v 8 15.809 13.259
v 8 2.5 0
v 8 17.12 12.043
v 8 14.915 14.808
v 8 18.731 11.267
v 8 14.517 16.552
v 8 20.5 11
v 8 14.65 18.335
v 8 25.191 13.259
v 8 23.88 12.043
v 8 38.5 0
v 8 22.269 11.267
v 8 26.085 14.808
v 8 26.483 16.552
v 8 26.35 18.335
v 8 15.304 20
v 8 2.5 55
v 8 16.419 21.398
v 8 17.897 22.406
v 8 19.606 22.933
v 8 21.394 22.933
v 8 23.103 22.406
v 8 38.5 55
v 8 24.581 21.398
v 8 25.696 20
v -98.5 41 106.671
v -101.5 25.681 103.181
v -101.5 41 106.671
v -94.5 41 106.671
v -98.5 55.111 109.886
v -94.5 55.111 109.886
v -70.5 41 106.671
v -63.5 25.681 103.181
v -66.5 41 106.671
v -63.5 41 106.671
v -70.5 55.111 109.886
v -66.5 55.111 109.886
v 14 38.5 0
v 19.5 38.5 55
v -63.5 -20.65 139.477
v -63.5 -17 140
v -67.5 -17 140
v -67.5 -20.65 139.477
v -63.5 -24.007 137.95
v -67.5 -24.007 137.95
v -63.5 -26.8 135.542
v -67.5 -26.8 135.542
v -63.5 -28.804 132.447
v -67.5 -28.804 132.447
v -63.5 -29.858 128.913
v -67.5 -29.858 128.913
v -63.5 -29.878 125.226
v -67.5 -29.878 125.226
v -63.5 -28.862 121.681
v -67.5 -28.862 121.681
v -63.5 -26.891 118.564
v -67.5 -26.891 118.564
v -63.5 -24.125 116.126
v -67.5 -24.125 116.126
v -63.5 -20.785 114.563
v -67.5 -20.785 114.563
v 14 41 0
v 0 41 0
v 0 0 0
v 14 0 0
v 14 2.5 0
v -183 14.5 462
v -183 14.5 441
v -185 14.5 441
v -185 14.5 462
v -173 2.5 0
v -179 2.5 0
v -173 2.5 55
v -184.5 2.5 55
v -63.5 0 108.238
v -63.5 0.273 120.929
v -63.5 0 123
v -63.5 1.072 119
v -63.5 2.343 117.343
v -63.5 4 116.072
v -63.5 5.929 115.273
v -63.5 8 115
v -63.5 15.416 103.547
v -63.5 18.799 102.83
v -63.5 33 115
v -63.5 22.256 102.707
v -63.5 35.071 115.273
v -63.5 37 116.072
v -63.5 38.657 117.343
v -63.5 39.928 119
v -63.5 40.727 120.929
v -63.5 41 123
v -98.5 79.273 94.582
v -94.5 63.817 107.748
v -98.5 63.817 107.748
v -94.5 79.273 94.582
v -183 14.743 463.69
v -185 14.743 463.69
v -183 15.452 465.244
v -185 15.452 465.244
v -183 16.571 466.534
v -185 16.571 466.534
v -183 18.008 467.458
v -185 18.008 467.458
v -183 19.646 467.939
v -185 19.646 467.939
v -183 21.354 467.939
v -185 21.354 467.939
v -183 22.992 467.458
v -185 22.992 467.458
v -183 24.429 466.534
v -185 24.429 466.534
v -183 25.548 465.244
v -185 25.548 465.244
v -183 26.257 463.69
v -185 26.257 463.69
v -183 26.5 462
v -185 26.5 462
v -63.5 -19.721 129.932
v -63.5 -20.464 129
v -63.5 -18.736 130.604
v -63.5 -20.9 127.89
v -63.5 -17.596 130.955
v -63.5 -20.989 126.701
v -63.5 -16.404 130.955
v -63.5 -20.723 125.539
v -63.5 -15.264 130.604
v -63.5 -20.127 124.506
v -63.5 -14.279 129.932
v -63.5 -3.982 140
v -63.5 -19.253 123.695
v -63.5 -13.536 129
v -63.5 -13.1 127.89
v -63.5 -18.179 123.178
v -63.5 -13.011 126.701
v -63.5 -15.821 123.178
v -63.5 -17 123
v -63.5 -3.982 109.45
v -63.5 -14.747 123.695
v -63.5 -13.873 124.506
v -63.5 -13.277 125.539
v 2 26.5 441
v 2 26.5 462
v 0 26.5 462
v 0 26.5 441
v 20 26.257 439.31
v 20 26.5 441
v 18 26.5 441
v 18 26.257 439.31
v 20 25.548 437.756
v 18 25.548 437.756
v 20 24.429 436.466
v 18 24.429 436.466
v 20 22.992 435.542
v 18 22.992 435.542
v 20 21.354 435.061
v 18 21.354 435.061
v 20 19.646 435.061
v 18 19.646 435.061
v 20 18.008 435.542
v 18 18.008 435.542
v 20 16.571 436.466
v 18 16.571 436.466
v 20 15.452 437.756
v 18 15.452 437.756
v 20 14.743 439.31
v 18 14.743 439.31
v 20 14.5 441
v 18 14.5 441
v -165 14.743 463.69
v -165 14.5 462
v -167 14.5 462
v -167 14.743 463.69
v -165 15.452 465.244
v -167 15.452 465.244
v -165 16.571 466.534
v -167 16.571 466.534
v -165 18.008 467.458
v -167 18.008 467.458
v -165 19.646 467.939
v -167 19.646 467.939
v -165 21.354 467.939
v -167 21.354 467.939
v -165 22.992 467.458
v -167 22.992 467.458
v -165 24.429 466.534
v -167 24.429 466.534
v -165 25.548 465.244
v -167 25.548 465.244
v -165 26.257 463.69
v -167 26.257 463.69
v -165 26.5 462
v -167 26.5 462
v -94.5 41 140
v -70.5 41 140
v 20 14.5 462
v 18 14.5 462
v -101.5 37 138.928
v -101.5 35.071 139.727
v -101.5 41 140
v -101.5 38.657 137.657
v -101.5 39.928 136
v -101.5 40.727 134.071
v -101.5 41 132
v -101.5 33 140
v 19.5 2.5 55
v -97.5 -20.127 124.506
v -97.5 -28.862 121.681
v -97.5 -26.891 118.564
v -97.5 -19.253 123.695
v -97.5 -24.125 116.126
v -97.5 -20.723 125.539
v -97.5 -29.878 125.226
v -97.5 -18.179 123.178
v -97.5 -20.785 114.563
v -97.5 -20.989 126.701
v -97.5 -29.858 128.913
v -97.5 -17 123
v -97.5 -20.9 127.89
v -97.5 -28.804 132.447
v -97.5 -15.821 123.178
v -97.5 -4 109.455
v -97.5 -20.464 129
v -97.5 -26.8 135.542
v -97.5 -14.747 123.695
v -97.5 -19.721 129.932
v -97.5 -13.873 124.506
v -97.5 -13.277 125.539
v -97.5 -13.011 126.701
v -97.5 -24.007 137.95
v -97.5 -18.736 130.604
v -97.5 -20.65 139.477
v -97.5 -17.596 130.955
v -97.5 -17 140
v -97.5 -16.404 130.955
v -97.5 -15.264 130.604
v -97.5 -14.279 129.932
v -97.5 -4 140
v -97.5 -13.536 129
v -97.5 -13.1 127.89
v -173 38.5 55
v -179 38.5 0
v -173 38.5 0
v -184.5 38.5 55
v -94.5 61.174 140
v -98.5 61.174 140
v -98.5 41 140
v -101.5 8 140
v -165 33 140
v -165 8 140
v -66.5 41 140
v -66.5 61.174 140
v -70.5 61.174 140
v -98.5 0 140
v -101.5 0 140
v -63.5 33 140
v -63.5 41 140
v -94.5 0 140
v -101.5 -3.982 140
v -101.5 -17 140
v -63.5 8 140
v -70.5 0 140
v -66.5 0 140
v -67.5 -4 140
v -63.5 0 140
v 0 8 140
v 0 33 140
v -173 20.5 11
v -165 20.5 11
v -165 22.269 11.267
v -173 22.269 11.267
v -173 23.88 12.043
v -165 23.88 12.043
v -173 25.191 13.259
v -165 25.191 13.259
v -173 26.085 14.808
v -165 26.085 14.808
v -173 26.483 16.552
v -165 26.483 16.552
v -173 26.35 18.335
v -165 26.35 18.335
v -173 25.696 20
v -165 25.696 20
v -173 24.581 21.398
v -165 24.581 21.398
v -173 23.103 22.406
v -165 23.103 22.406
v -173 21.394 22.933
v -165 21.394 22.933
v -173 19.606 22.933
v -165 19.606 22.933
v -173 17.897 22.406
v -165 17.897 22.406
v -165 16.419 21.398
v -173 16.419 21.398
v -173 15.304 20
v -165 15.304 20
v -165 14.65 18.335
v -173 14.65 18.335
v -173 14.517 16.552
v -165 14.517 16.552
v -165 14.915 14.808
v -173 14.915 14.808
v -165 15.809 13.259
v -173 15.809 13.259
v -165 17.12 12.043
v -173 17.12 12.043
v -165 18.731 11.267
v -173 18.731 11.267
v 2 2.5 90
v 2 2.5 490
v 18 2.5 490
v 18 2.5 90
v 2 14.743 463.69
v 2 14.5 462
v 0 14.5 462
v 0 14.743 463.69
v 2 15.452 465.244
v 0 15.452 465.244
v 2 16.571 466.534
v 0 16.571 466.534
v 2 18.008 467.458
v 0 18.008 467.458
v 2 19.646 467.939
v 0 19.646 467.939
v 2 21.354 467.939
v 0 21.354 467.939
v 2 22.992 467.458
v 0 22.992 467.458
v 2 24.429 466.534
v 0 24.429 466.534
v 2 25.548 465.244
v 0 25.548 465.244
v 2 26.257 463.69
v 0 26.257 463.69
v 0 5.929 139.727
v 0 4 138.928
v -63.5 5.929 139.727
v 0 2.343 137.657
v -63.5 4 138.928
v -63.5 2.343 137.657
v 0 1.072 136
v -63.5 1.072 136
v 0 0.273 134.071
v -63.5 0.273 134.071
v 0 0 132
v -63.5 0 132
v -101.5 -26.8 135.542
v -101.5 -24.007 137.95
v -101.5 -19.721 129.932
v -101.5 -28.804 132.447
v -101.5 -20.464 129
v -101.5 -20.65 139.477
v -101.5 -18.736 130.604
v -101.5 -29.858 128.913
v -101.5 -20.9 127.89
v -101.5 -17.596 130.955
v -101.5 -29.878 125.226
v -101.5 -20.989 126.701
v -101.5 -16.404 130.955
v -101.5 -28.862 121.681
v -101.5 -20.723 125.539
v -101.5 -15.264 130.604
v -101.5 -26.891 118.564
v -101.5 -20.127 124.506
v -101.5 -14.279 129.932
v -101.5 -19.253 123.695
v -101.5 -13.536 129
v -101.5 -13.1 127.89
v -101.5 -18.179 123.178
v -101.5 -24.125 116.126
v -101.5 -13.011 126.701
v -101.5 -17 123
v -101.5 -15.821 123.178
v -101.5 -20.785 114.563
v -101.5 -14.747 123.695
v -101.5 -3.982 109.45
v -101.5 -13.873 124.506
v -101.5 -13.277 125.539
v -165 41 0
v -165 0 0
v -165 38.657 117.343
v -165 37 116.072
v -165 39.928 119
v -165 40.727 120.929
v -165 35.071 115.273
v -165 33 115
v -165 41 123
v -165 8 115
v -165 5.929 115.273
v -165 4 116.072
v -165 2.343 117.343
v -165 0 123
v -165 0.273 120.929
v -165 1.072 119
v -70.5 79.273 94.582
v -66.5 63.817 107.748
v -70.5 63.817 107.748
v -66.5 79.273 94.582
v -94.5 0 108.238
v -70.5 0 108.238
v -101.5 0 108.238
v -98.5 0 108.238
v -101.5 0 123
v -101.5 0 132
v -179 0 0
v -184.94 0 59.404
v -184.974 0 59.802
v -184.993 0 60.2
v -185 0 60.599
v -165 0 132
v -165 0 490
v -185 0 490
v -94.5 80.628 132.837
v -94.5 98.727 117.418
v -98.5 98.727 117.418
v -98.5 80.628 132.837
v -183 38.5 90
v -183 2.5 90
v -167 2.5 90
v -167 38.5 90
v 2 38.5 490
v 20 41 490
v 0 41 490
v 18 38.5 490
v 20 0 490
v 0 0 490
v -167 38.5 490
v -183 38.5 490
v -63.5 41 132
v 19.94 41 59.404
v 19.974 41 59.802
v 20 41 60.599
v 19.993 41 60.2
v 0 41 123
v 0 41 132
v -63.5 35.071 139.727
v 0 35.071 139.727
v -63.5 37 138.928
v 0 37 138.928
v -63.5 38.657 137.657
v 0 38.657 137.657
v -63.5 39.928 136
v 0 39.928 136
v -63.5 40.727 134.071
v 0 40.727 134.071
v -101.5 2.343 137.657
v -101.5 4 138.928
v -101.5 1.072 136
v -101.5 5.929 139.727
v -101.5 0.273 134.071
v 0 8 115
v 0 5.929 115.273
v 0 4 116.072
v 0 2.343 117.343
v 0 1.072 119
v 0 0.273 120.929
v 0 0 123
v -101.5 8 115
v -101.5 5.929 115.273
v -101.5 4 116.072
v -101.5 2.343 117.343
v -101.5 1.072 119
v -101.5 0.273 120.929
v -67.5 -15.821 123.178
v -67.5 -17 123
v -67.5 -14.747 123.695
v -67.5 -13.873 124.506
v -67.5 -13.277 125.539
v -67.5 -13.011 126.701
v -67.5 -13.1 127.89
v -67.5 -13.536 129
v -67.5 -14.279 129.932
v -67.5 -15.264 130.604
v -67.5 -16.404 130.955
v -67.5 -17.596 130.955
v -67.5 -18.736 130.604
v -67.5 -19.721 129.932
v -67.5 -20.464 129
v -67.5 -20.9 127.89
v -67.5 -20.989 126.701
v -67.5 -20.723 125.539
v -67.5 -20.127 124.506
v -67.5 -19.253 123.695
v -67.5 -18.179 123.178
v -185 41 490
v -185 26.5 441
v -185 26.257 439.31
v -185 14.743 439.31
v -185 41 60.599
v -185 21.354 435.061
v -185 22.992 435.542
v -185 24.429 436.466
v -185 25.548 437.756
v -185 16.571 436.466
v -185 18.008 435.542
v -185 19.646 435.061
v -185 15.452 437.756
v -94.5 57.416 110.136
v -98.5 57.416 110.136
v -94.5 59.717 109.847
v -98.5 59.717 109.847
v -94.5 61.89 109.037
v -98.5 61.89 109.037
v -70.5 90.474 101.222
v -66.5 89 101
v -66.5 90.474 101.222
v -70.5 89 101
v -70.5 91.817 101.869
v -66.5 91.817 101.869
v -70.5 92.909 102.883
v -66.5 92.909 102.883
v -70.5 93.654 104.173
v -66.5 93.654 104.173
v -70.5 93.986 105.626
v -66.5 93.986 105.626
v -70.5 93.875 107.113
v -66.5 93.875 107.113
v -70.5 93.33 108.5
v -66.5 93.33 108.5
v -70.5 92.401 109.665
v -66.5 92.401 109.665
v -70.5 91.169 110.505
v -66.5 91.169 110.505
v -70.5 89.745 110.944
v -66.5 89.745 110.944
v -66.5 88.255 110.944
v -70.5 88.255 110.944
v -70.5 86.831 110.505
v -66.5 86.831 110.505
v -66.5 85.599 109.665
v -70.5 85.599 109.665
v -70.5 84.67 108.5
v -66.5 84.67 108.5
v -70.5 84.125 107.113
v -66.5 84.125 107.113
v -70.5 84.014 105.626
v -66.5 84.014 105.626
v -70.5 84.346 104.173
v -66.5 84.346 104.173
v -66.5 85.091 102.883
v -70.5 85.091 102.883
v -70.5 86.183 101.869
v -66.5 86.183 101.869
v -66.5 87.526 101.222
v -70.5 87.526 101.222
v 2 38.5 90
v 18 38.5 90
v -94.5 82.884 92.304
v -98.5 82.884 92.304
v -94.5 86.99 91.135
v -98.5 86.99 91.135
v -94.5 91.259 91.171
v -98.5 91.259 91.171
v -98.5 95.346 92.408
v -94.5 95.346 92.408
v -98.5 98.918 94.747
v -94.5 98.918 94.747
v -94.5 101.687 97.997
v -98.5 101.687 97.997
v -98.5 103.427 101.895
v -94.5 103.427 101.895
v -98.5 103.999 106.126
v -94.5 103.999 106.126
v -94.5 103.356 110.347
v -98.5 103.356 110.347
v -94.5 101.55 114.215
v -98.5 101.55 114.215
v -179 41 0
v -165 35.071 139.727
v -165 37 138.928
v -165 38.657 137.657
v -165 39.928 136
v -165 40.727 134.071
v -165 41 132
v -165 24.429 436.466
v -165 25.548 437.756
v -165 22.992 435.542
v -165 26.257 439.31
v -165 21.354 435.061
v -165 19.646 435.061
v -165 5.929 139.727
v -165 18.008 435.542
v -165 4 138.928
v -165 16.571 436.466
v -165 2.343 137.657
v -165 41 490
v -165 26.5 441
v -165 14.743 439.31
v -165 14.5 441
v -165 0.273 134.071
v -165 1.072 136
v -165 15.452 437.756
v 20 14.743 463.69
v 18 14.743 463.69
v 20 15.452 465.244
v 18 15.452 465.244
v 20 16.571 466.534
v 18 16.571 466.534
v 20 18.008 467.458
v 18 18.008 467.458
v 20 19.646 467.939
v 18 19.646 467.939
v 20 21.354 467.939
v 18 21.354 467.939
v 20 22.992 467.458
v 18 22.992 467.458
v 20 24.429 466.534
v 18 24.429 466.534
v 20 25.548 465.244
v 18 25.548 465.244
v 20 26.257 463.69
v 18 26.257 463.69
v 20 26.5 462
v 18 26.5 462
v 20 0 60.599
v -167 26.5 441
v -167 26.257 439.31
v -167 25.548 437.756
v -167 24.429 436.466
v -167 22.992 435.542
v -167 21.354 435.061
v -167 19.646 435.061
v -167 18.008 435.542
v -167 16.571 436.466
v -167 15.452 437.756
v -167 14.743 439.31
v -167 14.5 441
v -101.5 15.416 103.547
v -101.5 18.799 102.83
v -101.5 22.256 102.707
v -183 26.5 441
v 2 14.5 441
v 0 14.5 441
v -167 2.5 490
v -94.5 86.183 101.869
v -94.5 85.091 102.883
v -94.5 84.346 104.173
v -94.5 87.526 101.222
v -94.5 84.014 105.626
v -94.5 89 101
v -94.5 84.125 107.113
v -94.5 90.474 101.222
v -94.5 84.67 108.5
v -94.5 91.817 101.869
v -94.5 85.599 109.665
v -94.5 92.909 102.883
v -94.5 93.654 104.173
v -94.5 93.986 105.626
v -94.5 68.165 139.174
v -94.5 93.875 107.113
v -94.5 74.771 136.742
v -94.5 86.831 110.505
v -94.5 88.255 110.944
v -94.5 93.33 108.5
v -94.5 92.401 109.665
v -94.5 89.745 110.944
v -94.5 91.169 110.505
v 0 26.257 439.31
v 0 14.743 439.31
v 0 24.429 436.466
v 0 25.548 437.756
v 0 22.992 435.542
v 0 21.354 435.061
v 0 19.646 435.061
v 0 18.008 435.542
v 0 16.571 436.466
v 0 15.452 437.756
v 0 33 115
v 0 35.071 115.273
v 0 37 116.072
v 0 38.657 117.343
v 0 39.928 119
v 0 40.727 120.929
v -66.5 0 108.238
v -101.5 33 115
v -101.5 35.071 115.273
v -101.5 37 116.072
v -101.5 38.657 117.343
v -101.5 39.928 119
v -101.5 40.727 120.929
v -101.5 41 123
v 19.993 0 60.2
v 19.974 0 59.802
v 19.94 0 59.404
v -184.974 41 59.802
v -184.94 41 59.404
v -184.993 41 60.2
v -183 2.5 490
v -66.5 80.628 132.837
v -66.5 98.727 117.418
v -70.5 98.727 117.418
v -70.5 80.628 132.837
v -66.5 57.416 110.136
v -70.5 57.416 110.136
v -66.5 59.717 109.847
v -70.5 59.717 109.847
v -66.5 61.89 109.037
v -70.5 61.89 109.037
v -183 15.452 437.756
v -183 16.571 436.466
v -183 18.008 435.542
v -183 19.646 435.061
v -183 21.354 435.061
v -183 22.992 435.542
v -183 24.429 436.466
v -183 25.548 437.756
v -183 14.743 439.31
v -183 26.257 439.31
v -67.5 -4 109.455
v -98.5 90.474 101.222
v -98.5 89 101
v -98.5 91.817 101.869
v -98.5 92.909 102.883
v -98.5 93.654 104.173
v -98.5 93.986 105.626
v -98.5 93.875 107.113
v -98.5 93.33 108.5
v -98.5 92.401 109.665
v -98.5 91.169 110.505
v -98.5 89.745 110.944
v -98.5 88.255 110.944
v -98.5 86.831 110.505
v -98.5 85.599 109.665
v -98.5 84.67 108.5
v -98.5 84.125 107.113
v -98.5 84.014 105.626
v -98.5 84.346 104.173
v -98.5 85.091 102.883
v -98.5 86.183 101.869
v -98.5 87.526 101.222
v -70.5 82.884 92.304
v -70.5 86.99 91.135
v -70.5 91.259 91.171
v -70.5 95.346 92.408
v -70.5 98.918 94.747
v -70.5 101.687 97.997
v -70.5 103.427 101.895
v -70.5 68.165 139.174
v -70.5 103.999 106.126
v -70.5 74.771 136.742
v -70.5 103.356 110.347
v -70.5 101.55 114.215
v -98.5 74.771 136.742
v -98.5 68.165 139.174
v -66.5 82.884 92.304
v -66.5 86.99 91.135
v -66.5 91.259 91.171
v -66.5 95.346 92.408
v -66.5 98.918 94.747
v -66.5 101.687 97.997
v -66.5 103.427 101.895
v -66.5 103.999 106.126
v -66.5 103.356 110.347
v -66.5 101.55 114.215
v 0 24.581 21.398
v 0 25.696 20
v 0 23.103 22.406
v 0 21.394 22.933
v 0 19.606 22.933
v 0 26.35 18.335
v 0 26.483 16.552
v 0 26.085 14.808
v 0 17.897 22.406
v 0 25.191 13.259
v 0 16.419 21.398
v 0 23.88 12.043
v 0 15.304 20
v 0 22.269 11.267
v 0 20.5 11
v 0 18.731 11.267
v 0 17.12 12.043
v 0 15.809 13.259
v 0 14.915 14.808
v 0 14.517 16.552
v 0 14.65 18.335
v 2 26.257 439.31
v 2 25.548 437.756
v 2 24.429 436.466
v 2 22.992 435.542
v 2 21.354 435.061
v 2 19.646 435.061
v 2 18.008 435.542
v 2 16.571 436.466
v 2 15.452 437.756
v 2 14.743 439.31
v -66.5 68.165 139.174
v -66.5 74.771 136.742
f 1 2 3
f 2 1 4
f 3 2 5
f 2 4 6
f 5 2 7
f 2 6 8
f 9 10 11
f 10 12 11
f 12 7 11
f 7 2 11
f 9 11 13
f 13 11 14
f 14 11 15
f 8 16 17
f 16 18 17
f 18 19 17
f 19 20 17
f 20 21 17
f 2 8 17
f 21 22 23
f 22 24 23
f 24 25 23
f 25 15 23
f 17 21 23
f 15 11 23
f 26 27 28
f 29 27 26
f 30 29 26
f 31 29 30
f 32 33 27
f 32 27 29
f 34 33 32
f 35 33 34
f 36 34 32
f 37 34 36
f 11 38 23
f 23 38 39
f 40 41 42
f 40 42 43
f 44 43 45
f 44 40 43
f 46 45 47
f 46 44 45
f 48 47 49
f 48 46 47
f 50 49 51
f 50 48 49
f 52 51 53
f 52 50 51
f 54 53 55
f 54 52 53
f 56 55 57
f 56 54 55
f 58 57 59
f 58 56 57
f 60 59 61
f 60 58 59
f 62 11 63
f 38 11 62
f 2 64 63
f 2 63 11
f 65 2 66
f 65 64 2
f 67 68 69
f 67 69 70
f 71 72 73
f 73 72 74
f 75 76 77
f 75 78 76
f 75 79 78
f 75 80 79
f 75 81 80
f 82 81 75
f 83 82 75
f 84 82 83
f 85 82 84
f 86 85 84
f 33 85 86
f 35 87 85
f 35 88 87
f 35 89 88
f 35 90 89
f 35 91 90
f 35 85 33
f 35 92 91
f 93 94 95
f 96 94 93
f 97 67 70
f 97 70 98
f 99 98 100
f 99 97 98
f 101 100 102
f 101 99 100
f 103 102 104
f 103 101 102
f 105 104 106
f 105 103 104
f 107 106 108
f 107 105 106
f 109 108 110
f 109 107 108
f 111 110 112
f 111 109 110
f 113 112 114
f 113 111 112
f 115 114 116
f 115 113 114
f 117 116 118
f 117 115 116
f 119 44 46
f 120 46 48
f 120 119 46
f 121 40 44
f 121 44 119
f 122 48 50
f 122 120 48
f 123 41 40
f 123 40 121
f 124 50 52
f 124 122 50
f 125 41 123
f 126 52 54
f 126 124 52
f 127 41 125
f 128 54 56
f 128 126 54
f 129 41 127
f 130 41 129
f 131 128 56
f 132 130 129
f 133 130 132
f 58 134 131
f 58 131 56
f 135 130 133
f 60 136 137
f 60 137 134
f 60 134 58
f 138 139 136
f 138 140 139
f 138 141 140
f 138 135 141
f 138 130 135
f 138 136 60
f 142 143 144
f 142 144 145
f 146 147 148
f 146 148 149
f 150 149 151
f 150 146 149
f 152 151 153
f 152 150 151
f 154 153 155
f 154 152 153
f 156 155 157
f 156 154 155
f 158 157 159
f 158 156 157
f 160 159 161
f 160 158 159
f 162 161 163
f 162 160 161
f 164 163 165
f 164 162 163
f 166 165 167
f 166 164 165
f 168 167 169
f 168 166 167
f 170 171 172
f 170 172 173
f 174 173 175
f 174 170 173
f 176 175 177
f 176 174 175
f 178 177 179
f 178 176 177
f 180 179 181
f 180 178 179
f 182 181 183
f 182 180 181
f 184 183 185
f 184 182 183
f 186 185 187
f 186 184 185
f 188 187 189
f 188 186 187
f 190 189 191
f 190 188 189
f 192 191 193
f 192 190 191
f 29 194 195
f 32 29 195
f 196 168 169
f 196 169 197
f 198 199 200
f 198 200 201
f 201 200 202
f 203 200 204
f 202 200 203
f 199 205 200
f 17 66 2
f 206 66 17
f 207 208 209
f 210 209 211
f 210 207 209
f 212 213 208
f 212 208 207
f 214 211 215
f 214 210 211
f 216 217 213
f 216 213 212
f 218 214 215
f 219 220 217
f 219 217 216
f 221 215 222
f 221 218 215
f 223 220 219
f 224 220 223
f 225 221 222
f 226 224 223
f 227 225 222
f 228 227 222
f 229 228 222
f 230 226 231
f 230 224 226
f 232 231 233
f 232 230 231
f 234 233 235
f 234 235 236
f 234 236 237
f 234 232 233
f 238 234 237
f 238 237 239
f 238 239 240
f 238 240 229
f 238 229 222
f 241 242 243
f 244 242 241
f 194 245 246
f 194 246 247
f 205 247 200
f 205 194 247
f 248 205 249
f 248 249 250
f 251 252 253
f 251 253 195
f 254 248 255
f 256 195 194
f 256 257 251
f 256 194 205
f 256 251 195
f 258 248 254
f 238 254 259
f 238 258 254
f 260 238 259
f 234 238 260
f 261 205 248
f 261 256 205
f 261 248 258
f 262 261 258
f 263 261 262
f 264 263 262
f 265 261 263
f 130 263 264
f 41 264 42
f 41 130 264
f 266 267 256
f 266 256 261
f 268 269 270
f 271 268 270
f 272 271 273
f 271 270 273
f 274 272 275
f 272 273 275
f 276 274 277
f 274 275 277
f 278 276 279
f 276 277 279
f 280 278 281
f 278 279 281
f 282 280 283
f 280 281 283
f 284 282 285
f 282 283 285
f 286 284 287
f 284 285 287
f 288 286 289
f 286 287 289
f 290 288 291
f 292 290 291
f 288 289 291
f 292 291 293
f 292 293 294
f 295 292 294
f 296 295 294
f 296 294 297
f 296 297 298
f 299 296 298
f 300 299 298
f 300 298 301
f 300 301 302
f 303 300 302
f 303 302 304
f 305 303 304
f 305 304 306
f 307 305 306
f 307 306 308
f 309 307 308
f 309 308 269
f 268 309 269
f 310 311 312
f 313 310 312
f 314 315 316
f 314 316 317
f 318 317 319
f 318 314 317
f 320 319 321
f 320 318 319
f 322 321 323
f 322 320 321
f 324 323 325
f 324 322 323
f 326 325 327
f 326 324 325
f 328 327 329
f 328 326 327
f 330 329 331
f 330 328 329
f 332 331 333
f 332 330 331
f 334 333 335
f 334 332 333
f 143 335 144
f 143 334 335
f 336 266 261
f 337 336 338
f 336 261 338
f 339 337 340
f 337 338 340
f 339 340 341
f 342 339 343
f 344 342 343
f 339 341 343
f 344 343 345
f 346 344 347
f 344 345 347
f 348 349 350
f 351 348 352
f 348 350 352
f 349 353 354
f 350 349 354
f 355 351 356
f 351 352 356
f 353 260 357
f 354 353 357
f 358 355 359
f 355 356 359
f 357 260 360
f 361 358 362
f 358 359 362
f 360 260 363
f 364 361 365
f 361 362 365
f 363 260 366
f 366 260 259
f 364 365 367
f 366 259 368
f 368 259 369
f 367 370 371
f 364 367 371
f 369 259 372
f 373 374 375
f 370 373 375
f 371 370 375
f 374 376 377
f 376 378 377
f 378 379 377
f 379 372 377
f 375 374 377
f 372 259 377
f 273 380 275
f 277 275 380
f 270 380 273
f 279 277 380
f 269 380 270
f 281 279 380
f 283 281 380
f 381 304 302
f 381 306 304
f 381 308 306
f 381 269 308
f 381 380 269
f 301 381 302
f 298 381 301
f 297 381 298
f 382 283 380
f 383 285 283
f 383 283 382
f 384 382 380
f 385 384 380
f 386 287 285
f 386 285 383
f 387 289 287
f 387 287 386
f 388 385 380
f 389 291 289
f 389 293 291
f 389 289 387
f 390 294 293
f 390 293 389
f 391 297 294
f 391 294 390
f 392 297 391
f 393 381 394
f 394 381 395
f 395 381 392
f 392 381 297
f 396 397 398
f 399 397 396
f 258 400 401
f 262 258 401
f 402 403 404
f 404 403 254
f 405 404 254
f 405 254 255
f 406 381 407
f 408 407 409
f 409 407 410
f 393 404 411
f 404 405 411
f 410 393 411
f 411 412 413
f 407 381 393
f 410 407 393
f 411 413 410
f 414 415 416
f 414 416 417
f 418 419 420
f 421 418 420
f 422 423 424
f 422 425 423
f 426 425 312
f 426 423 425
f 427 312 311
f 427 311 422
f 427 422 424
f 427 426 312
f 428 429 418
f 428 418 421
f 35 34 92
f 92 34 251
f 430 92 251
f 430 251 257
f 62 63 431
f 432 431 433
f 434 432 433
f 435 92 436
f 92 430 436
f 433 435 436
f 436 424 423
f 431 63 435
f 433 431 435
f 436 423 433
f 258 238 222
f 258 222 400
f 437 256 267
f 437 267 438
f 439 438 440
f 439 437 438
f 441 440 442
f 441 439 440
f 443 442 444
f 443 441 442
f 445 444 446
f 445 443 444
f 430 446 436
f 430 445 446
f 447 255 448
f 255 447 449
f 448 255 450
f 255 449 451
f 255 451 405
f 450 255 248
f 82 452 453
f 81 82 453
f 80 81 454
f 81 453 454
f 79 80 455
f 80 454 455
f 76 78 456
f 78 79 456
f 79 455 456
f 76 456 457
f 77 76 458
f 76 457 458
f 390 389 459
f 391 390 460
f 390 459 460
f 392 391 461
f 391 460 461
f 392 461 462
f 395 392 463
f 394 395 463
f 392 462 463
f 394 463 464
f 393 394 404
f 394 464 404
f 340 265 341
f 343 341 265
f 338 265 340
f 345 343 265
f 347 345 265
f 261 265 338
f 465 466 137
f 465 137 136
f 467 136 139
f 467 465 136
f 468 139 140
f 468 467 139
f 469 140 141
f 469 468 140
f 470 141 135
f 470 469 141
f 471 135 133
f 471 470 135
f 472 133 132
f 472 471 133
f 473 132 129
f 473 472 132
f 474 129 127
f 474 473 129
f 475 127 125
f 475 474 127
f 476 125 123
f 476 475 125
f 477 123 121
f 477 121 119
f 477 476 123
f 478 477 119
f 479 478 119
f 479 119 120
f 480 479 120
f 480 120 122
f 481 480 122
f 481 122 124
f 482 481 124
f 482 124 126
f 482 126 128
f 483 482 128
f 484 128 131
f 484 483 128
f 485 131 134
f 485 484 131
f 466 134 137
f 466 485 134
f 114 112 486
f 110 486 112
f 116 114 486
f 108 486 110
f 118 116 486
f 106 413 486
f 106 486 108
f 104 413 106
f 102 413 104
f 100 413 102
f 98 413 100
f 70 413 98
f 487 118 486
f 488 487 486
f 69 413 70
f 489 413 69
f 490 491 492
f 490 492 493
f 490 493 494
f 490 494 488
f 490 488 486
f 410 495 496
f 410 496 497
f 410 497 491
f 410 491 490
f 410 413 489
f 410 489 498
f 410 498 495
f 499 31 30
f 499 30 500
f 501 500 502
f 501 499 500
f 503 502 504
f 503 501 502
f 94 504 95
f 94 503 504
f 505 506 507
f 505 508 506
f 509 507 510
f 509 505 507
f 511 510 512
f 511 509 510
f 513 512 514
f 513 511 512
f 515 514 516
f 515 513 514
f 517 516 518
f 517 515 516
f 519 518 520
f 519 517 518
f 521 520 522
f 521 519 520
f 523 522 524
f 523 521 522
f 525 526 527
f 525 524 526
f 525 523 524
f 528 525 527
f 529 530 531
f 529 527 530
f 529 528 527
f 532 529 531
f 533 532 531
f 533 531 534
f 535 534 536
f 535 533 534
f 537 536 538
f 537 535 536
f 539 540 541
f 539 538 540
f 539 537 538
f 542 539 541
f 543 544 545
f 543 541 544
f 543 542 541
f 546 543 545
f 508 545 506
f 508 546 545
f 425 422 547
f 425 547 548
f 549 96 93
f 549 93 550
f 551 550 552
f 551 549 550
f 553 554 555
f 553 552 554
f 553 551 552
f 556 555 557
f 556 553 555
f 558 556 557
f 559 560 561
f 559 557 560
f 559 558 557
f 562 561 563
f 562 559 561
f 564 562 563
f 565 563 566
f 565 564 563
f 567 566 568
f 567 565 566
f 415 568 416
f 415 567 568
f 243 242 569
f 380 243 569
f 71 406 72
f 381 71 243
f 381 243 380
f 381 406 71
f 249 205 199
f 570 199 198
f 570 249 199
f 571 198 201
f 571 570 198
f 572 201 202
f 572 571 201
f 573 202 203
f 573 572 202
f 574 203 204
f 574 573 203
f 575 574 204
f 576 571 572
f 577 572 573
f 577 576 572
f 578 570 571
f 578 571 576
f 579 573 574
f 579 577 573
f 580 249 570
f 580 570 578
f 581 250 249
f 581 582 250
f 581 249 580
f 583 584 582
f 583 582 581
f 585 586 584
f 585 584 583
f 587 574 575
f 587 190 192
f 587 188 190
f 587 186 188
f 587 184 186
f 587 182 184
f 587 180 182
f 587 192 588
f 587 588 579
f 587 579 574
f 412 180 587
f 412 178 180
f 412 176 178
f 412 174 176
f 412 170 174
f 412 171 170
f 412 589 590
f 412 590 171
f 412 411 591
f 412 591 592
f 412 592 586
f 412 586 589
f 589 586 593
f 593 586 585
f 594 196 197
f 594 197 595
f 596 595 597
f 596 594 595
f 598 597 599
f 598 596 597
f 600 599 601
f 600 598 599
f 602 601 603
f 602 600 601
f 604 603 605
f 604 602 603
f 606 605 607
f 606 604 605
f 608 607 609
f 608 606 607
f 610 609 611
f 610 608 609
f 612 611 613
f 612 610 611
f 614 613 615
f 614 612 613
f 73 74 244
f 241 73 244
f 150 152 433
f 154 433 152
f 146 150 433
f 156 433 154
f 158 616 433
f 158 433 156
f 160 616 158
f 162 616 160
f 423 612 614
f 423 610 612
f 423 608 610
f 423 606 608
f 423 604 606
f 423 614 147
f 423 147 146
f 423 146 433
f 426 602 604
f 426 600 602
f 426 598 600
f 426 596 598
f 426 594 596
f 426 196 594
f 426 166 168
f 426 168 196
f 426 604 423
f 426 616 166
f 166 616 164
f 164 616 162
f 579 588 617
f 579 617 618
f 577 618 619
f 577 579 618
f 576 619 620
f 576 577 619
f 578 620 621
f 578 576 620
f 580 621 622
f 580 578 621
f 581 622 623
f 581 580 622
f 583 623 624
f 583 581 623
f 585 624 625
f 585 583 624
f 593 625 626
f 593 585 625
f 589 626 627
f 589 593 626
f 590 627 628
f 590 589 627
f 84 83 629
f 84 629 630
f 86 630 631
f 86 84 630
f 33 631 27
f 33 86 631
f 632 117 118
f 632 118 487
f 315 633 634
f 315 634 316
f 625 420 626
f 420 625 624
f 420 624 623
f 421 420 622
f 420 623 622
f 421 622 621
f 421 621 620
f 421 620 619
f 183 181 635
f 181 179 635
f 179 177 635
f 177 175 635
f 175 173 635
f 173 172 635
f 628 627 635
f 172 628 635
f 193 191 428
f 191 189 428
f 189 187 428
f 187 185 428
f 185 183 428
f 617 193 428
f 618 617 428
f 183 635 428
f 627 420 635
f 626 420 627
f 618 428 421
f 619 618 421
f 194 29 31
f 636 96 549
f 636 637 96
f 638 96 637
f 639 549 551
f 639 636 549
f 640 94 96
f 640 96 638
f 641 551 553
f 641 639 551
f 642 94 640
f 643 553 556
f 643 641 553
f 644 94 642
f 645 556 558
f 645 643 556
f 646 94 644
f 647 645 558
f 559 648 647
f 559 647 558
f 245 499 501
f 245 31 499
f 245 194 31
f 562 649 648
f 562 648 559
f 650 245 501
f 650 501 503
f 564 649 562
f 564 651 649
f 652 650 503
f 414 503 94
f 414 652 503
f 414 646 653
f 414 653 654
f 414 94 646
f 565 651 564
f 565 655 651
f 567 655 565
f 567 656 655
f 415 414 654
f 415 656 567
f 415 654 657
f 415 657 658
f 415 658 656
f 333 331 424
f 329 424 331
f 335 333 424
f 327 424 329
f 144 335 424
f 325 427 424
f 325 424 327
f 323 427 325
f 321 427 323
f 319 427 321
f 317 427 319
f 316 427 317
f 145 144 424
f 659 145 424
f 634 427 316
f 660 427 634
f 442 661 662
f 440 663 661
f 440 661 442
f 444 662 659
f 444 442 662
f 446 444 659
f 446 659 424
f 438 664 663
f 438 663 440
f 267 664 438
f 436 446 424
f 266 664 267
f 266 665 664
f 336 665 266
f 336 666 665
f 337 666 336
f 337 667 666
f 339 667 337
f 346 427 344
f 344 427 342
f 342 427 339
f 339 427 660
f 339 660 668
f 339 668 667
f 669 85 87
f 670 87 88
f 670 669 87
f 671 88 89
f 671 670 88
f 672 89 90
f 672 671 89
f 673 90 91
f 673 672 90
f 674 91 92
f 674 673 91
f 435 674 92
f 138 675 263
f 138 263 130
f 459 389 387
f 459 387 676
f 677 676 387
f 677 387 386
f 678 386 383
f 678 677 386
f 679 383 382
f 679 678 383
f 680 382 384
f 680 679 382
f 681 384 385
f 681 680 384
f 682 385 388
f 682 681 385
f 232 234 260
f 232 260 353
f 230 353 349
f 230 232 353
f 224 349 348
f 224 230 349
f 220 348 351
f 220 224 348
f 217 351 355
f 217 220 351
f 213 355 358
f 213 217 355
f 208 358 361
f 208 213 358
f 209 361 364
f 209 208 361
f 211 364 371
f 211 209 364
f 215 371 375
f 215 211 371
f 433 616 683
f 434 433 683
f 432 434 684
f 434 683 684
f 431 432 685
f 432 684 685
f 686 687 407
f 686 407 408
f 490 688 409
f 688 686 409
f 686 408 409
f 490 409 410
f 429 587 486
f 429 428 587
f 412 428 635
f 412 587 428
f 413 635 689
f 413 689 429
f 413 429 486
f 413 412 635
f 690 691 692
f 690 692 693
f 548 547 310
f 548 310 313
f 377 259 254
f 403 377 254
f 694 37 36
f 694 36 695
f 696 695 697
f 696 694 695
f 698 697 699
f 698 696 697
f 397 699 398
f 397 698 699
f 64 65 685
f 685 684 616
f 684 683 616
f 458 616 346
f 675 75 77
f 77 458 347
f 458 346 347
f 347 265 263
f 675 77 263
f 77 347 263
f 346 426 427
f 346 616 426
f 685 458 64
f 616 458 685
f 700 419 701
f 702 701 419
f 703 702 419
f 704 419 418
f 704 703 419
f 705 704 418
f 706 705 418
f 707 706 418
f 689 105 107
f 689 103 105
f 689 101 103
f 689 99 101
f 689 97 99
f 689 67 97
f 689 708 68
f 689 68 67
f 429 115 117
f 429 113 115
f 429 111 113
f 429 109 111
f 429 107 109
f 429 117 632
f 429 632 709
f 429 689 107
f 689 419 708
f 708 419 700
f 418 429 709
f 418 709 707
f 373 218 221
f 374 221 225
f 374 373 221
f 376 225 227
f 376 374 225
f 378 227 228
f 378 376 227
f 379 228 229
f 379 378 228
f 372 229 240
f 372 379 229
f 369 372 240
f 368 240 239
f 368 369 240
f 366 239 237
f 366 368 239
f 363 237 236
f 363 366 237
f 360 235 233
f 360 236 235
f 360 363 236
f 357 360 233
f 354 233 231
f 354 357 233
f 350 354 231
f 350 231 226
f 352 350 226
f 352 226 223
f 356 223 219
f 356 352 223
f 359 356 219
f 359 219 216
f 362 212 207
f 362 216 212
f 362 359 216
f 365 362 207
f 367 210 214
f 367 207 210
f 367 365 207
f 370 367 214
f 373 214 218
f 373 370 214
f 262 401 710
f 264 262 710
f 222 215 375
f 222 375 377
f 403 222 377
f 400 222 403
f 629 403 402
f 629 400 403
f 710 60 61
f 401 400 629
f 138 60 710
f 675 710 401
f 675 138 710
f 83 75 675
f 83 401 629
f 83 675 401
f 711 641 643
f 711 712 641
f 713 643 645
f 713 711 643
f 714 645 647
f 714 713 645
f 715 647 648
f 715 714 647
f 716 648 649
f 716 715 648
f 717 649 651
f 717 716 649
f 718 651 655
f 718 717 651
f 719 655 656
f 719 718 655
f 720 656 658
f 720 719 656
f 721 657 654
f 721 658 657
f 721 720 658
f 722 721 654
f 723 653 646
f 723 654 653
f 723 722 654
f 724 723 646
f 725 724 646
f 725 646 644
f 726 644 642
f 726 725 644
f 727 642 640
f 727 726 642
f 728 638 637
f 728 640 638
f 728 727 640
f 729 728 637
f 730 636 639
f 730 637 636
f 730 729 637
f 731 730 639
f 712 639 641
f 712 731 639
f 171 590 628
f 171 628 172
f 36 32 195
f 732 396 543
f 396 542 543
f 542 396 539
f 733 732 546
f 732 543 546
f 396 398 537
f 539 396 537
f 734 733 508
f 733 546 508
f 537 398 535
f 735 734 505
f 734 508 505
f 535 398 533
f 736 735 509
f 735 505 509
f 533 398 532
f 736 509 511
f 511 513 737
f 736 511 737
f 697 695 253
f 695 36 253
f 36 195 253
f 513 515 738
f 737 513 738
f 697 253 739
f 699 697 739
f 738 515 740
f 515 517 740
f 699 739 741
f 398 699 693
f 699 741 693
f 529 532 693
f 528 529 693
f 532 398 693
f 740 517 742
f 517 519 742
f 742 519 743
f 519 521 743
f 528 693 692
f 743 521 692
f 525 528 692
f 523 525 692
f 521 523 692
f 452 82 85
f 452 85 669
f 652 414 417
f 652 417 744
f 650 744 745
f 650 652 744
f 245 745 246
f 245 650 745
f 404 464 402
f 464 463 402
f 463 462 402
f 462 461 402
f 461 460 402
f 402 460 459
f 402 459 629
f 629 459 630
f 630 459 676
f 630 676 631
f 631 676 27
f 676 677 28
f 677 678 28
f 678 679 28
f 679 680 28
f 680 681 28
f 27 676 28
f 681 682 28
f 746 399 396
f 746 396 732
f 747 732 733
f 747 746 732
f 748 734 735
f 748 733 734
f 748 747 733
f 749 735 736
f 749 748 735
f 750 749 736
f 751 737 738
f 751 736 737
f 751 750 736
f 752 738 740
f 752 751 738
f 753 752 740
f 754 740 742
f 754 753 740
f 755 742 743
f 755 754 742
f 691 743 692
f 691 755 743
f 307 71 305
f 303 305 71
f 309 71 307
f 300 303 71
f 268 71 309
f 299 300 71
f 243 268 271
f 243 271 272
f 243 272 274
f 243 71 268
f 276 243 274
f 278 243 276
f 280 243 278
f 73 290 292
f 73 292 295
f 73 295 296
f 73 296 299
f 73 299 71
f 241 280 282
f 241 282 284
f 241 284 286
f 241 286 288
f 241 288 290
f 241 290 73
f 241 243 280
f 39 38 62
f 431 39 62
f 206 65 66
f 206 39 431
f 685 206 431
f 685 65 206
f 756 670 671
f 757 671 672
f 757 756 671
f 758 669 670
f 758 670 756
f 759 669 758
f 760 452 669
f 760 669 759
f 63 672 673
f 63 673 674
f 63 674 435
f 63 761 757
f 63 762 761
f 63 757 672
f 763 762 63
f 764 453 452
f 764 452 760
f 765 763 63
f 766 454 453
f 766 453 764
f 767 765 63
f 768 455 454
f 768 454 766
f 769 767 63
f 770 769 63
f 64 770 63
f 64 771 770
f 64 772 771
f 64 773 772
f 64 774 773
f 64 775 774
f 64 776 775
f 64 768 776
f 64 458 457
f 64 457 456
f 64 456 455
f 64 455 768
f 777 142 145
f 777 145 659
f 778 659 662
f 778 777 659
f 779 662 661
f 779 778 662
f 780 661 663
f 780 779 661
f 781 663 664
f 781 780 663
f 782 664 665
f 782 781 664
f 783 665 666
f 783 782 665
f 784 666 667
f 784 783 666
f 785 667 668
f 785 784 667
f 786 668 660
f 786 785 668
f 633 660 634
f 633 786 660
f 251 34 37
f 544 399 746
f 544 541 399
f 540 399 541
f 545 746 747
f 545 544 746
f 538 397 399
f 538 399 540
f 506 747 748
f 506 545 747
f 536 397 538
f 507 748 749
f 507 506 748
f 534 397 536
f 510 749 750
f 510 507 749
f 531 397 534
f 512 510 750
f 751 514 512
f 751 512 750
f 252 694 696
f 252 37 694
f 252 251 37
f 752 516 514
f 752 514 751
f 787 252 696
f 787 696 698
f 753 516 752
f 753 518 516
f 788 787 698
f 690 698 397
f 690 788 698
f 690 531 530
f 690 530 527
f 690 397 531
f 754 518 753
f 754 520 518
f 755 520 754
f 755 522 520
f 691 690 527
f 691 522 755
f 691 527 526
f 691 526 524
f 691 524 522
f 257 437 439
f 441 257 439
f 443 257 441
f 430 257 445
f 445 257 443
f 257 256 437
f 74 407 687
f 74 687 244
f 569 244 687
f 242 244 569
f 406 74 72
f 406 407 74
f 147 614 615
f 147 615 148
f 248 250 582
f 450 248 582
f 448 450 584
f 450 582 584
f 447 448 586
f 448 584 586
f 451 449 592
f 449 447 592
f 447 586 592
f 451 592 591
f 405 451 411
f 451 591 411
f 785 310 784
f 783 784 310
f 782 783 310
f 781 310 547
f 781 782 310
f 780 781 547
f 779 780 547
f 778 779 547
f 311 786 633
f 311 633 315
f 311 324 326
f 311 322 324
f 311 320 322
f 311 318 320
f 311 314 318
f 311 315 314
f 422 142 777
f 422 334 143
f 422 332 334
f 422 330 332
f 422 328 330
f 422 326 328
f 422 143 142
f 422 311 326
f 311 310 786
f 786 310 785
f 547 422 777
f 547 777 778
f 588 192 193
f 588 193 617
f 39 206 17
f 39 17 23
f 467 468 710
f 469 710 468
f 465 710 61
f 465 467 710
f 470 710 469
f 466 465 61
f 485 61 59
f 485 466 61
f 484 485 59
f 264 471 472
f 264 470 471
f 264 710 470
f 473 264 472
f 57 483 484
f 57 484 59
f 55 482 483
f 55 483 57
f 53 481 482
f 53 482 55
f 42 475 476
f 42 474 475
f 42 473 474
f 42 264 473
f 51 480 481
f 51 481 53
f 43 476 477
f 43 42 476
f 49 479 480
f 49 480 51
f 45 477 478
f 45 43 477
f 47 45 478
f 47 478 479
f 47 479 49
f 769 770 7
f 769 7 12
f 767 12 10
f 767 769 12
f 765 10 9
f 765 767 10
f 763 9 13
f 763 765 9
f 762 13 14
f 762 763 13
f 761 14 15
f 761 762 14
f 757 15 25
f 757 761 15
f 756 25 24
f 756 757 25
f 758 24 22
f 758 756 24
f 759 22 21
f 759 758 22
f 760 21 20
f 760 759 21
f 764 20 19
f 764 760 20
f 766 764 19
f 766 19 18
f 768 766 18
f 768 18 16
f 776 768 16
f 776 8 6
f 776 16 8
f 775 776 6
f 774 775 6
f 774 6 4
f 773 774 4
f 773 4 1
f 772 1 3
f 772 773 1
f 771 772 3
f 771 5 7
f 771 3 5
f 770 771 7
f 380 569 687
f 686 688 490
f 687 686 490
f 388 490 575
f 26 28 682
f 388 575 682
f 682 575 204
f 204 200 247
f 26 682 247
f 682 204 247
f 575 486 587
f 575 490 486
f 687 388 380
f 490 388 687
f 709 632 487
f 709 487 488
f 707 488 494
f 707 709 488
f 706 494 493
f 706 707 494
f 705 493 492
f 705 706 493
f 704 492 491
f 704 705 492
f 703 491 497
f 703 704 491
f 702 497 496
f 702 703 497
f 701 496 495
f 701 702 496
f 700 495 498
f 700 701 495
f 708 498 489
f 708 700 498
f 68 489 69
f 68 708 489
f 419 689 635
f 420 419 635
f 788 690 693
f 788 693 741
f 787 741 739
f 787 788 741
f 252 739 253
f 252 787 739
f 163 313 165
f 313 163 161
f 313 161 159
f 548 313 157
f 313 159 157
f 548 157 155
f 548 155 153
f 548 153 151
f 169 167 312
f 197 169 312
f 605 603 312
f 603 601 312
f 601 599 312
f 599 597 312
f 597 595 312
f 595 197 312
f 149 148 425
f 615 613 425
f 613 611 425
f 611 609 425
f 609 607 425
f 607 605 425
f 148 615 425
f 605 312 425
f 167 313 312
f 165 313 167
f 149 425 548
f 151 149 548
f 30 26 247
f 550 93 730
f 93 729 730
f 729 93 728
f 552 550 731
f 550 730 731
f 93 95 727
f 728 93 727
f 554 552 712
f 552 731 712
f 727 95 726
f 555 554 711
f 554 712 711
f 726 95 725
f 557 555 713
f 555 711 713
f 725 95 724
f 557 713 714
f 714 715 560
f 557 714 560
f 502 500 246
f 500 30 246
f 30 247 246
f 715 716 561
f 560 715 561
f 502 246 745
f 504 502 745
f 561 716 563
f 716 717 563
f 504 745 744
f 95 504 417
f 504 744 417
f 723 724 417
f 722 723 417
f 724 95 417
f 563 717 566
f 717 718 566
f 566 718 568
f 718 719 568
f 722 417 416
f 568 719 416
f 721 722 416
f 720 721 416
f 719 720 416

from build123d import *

# Parameters (mm, degrees)
EXTRUDE_1_DEPTH     = 41
FILLET_4_R          = 8
SKETCH_2_R          = 6
CUT_EXTRUDE_1_DEPTH = 115.5
SKETCH_3_W          = 16
SKETCH_3_H          = 36
CUT_EXTRUDE_2_DEPTH = 400
SKETCH_4_W          = 70
SKETCH_4_H          = 36
CUT_EXTRUDE_3_DEPTH = 12
FILLET_5_R          = 12
FILLET_6_R          = 12
SKETCH_5_R          = 4
SKETCH_5_R_2        = 5
EXTRUDE_2_DEPTH     = 19
SKETCH_6_W          = 3
SKETCH_6_H          = 63
SKETCH_6_W_2        = 24
CUT_EXTRUDE_4_DEPTH = 68


with BuildPart() as part:
    # Эскиз1 → Бобышка-Вытянуть1 (new body)
    with BuildSketch(Plane(origin=(0, 0, 0), x_dir=(1, 0, 0), z_dir=(0, 1, 0))):
        Polygon((0, 0), (14, 0), (20, -60), (20, -490), (0, -490), (0, -140), (-165, -140), (-165, -490), (-185, -490), (-185, -60), (-179, 0), (-165, 0), (-165, -115), (0, -115), align=None)
    extrude(amount=EXTRUDE_1_DEPTH)

    # Скругление4
    fillet_4_edges = [part.edges().sort_by_distance(p)[0] for p in [
        (-82.5, 0, 140),
        (-82.5, 0, 115),
        (-82.5, 41, 140),
        (-82.5, 41, 115),
    ]]
    fillet(fillet_4_edges, radius=FILLET_4_R)

    # Эскиз2 → Вырез-Вытянуть1 (cut, symmetric)
    with BuildSketch(Plane(origin=(-82.5, 0, 0), x_dir=(0, 0, -1), z_dir=(1, 0, 0))):
        with Locations((-17, 20.5)):
            Circle(SKETCH_2_R)
        with BuildLine():
            Line((-462, 26.5), (-441, 26.5))
            ThreePointArc((-441, 26.5), (-435, 20.5), (-441, 14.5))
            Line((-441, 14.5), (-462, 14.5))
            ThreePointArc((-462, 14.5), (-468, 20.5), (-462, 26.5))
        make_face()
    extrude(amount=CUT_EXTRUDE_1_DEPTH, both=True, mode=Mode.SUBTRACT)

    # Эскиз3 → Вырез-Вытянуть2 (cut)
    with BuildSketch(Plane.XY.offset(490)):
        with Locations((10, 20.5)):
            Rectangle(SKETCH_3_W, SKETCH_3_H)
        with Locations((-175, 20.5)):
            Rectangle(SKETCH_3_W, SKETCH_3_H)
    extrude(amount=-CUT_EXTRUDE_2_DEPTH, mode=Mode.SUBTRACT)

    # Эскиз4 → Вырез-Вытянуть3 (cut)
    with BuildSketch(Plane.ZY.offset(185)):
        with Locations((20, 20.5)):
            Rectangle(SKETCH_4_W, SKETCH_4_H)
    cut_extrude_3 = extrude(amount=-CUT_EXTRUDE_3_DEPTH, mode=Mode.SUBTRACT)

    # Зеркальное отражение1: Вырез-Вытянуть3 across plane
    add(cut_extrude_3.mirror(Plane(origin=(-82.5, 0, 0), x_dir=(0, 0, 1), z_dir=(1, 0, 0))), mode=Mode.SUBTRACT)

    # Скругление5
    # the kernel refuses this fillet: 12 mm, written as the material it takes off along each edge
    with BuildSketch(Plane(origin=(20, -1.496268634, 60), x_dir=(-0.0995037190210001, 0, -0.995037190209989), z_dir=(0, 1, 0))) as fillet_5_piece_1:
        with BuildLine():
            CenterArc((FILLET_5_R * 0.0498756211209, FILLET_5_R), FILLET_5_R, 264.289406863, 5.710593137)
            Line((-FILLET_5_R * 0.0496280979001, FILLET_5_R * 0.00496280979001), (0, 0))
            Line((0, 0), (FILLET_5_R * 0.0498756211209, 0))
        make_face()
    extrude(amount=43.992537267, mode=Mode.SUBTRACT)

    # Скругление6
    # the kernel refuses this fillet: 12 mm, written as the material it takes off along each edge
    with BuildSketch(Plane(origin=(-185, -1.496268634, 60), x_dir=(0.09950371902099304, 0, -0.9950371902099898), z_dir=(0, 1, 0))) as fillet_6_piece_1:
        with BuildLine():
            CenterArc((FILLET_6_R * 0.0498756211209, -FILLET_6_R), FILLET_6_R, 90, 5.710593137)
            Line((-FILLET_6_R * 0.0496280979001, -FILLET_6_R * 0.00496280979001), (0, 0))
            Line((0, 0), (FILLET_6_R * 0.0498756211209, 0))
        make_face()
    extrude(amount=43.992537267, mode=Mode.SUBTRACT)

    # Эскиз5 → Бобышка-Вытянуть2 (add, symmetric)
    with BuildSketch(Plane(origin=(-82.5, 0, 0), x_dir=(0, 0, -1), z_dir=(1, 0, 0))):
        with BuildLine():
            Line((-140, 61.173848335), (-140, -17))
            ThreePointArc((-140, -17), (-128.913133611, -29.858457131), (-114.563089264, -20.784607158))
            Line((-114.563089264, -20.784607158), (-103.54711014, 15.415913355))
            ThreePointArc((-103.54711014, 15.415913355), (-102.693554475, 20.5247626), (-103.180589505, 25.681476162))
            Line((-103.180589505, 25.681476162), (-109.885999017, 55.110773465))
            ThreePointArc((-109.885999017, 55.110773465), (-109.847393001, 59.716977585), (-107.748140134, 63.81719029))
            Line((-107.748140134, 63.81719029), (-94.581616231, 79.272692454))
            ThreePointArc((-94.581616231, 79.272692454), (-96.272692454, 100.418383769), (-117.418383769, 98.727307546))
            Line((-117.418383769, 98.727307546), (-132.836767538, 80.628463428))
            ThreePointArc((-132.836767538, 80.628463428), (-138.152291436, 71.539584533), (-140, 61.173848335))
        make_face()
        with Locations((-127, -17)):
            Circle(SKETCH_5_R, mode=Mode.SUBTRACT)
        with Locations((-106, 89)):
            Circle(SKETCH_5_R_2, mode=Mode.SUBTRACT)
    extrude(amount=EXTRUDE_2_DEPTH, both=True)

    # Эскиз6 → Вырез-Вытянуть4 (cut)
    with BuildSketch(Plane.XY.offset(140)):
        with Locations((-100, 72.5)):
            Rectangle(SKETCH_6_W, SKETCH_6_H)
        Polygon((-101.513854398, -4), (-98.5, 0), (-101.5, 0), align=None)
        Polygon((-94.5, 0), (-70.5, 0), (-67.5, -4), (-67.5, -30), (-97.5, -30), (-97.5, -4), align=None)
        with Locations((-82.5, 72.5)):
            Rectangle(SKETCH_6_W_2, SKETCH_6_H)
        Polygon((-63.486145602, -4), (-63.5, 0), (-66.5, 0), align=None)
        with Locations((-65, 72.5)):
            Rectangle(SKETCH_6_W, SKETCH_6_H)
    extrude(amount=-CUT_EXTRUDE_4_DEPTH, mode=Mode.SUBTRACT)


solid = part.part
